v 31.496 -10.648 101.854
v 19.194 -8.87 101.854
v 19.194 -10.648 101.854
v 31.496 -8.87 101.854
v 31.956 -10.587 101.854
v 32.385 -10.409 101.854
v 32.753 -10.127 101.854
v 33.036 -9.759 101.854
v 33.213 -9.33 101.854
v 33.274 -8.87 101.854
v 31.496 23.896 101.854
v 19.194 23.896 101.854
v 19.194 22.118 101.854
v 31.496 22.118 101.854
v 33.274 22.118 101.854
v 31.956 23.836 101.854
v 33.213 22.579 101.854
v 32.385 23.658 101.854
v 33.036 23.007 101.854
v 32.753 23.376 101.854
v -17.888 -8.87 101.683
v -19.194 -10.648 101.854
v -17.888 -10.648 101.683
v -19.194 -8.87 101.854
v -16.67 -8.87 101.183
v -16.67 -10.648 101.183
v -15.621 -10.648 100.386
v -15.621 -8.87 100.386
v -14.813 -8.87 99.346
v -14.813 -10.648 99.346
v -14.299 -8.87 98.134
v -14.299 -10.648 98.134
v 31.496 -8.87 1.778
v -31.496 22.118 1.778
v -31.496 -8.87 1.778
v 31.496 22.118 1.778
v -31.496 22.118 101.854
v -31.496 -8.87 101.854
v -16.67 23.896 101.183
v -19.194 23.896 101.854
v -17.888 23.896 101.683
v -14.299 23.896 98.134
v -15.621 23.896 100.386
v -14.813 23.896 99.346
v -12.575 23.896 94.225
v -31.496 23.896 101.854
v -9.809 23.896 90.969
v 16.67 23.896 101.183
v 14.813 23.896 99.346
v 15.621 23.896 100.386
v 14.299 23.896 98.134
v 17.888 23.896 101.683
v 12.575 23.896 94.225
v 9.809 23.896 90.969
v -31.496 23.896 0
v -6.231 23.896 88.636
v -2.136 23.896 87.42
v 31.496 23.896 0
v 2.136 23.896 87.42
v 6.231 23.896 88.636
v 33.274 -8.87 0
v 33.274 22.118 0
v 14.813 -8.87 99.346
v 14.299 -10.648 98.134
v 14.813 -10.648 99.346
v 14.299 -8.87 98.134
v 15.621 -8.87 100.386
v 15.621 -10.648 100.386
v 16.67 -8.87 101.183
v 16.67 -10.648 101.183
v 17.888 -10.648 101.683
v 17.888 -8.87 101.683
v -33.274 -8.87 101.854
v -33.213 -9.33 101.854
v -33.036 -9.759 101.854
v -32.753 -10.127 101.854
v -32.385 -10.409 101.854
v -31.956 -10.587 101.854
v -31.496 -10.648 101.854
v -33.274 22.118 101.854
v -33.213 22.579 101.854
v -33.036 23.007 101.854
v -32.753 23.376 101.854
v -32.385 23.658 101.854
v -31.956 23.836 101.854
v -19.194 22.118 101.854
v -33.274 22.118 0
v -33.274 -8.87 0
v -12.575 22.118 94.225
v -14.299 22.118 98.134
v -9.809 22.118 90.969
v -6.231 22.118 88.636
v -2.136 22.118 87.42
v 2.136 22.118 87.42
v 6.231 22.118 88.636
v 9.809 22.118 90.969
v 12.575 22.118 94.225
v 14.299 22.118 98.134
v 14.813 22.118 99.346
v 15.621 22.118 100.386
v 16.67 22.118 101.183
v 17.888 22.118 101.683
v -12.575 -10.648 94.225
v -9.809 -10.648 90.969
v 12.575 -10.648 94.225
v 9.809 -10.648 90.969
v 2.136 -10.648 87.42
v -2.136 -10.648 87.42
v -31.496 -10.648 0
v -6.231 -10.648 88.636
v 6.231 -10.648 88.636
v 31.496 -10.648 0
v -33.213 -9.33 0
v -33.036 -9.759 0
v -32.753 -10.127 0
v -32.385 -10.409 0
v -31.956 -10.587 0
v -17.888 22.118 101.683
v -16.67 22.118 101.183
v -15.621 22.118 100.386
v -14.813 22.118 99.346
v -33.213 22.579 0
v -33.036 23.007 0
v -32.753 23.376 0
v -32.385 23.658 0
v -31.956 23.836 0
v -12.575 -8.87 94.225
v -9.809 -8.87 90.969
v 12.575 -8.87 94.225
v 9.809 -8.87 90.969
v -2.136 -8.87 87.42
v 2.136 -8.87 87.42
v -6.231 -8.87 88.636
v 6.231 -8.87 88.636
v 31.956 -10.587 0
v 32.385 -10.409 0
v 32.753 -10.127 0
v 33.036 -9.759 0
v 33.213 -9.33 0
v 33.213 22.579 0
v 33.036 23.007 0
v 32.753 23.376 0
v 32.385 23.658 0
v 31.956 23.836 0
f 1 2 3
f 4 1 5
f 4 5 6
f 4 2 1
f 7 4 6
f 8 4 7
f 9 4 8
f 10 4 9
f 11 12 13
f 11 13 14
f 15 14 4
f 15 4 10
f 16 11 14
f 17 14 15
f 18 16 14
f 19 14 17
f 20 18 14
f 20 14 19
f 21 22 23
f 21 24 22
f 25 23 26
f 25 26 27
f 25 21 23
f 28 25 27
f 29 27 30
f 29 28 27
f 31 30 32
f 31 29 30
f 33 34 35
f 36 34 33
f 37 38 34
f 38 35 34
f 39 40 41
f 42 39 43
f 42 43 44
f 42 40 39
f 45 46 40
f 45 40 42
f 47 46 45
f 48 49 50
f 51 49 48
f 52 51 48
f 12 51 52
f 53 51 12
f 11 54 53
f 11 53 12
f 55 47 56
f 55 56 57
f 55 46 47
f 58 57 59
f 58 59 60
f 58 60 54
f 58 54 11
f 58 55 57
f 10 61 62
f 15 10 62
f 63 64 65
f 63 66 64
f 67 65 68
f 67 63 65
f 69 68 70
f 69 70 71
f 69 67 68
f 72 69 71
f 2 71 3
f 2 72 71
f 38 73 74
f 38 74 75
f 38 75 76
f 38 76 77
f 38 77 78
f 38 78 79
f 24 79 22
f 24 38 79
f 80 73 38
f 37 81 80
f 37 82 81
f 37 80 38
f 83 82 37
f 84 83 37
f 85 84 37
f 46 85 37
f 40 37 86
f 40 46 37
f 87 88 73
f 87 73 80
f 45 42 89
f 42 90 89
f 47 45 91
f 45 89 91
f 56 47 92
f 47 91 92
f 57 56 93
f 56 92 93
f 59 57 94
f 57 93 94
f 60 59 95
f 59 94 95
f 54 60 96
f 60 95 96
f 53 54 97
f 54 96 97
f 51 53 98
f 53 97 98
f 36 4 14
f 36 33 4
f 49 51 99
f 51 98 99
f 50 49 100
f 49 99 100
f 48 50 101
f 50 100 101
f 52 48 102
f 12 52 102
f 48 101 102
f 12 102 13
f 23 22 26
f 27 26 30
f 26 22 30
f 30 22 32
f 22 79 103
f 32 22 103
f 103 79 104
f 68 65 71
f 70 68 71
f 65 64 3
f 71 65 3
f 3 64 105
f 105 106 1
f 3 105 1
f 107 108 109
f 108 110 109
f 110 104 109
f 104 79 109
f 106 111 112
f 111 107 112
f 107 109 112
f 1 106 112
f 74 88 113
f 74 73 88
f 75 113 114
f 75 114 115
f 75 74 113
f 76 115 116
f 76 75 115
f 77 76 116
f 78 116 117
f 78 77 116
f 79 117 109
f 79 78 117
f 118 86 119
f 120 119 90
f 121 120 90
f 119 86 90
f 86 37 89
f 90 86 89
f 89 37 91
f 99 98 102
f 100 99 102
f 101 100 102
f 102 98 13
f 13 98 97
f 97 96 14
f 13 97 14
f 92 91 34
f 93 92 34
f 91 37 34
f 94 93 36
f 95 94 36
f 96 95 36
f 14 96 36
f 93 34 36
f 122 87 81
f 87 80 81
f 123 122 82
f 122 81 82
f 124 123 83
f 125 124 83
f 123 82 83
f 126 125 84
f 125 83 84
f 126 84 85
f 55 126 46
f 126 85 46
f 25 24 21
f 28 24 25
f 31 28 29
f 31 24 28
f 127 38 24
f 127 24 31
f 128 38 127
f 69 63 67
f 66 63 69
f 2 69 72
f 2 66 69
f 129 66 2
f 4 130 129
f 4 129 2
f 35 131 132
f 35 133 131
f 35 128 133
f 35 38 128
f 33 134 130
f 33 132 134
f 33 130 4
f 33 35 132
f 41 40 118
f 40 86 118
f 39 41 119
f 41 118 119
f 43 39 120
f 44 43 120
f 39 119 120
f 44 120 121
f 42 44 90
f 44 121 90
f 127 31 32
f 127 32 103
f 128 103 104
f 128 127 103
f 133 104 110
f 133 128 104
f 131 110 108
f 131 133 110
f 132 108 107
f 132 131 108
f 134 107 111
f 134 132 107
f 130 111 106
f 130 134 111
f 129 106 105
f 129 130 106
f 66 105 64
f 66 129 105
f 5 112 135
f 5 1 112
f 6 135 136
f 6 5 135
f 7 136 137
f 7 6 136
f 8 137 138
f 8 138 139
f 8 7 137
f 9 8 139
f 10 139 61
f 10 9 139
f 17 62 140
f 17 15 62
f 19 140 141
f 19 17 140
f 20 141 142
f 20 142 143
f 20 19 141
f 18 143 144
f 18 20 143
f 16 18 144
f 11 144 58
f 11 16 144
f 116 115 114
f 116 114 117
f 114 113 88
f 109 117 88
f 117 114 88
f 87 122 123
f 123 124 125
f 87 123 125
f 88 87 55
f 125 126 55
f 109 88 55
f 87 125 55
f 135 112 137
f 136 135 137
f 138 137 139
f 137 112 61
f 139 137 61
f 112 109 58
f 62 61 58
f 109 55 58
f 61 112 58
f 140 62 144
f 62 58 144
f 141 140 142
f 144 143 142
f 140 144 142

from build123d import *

# Parameters (mm, degrees)
F0_W     = 66.548
F0_H     = 34.544
F1_DEPTH = 101.854
F2_T     = -1.778
F3_R     = 1.778
F4_R     = 14.8402874642
F5_DEPTH = 23.89732
F6_DEPTH = 25.4
F7_R     = 5.08


with BuildPart() as f1:
    # F0 (on Top) → F1 (new body)
    with BuildSketch(Plane.XY):
        with Locations((0, 6.62432)):
            Rectangle(F0_W, F0_H)
    extrude(amount=F1_DEPTH)

    # F2
    f2_openings = [f1.faces().sort_by_distance(p)[0] for p in [
        (0, 6.62432, 101.854),
    ]]
    offset(amount=F2_T, openings=f2_openings)

    # F3
    f3_edges = [f1.edges().sort_by_distance(p)[0] for p in [
        (-33.274, 23.89632, 50.927),
        (-33.274, -10.64768, 50.927),
        (33.274, -10.64768, 50.927),
        (33.274, 23.89632, 50.927),
    ]]
    fillet(f3_edges, radius=F3_R)

    # F4 (on Front) → F5 (cut, through all)
    with BuildSketch(Plane.XZ):
        with Locations((0, 102.1052822471)):
            Circle(F4_R)
    extrude(amount=-F5_DEPTH, mode=Mode.SUBTRACT)

    # F4 (on Front) → F6 (cut)
    with BuildSketch(Plane.XZ):
        with Locations((0, 102.1052822471)):
            Circle(F4_R)
    extrude(amount=F6_DEPTH, mode=Mode.SUBTRACT)

    # F7
    f7_edges = [f1.edges().sort_by_distance(p)[0] for p in [
        (-14.83816, 23.00732, 101.854),
        (14.83816, 23.00732, 101.854),
        (14.83816, -9.75868, 101.854),
        (-14.83816, -9.75868, 101.854),
    ]]
    fillet(f7_edges, radius=F7_R)


solid = f1.part
